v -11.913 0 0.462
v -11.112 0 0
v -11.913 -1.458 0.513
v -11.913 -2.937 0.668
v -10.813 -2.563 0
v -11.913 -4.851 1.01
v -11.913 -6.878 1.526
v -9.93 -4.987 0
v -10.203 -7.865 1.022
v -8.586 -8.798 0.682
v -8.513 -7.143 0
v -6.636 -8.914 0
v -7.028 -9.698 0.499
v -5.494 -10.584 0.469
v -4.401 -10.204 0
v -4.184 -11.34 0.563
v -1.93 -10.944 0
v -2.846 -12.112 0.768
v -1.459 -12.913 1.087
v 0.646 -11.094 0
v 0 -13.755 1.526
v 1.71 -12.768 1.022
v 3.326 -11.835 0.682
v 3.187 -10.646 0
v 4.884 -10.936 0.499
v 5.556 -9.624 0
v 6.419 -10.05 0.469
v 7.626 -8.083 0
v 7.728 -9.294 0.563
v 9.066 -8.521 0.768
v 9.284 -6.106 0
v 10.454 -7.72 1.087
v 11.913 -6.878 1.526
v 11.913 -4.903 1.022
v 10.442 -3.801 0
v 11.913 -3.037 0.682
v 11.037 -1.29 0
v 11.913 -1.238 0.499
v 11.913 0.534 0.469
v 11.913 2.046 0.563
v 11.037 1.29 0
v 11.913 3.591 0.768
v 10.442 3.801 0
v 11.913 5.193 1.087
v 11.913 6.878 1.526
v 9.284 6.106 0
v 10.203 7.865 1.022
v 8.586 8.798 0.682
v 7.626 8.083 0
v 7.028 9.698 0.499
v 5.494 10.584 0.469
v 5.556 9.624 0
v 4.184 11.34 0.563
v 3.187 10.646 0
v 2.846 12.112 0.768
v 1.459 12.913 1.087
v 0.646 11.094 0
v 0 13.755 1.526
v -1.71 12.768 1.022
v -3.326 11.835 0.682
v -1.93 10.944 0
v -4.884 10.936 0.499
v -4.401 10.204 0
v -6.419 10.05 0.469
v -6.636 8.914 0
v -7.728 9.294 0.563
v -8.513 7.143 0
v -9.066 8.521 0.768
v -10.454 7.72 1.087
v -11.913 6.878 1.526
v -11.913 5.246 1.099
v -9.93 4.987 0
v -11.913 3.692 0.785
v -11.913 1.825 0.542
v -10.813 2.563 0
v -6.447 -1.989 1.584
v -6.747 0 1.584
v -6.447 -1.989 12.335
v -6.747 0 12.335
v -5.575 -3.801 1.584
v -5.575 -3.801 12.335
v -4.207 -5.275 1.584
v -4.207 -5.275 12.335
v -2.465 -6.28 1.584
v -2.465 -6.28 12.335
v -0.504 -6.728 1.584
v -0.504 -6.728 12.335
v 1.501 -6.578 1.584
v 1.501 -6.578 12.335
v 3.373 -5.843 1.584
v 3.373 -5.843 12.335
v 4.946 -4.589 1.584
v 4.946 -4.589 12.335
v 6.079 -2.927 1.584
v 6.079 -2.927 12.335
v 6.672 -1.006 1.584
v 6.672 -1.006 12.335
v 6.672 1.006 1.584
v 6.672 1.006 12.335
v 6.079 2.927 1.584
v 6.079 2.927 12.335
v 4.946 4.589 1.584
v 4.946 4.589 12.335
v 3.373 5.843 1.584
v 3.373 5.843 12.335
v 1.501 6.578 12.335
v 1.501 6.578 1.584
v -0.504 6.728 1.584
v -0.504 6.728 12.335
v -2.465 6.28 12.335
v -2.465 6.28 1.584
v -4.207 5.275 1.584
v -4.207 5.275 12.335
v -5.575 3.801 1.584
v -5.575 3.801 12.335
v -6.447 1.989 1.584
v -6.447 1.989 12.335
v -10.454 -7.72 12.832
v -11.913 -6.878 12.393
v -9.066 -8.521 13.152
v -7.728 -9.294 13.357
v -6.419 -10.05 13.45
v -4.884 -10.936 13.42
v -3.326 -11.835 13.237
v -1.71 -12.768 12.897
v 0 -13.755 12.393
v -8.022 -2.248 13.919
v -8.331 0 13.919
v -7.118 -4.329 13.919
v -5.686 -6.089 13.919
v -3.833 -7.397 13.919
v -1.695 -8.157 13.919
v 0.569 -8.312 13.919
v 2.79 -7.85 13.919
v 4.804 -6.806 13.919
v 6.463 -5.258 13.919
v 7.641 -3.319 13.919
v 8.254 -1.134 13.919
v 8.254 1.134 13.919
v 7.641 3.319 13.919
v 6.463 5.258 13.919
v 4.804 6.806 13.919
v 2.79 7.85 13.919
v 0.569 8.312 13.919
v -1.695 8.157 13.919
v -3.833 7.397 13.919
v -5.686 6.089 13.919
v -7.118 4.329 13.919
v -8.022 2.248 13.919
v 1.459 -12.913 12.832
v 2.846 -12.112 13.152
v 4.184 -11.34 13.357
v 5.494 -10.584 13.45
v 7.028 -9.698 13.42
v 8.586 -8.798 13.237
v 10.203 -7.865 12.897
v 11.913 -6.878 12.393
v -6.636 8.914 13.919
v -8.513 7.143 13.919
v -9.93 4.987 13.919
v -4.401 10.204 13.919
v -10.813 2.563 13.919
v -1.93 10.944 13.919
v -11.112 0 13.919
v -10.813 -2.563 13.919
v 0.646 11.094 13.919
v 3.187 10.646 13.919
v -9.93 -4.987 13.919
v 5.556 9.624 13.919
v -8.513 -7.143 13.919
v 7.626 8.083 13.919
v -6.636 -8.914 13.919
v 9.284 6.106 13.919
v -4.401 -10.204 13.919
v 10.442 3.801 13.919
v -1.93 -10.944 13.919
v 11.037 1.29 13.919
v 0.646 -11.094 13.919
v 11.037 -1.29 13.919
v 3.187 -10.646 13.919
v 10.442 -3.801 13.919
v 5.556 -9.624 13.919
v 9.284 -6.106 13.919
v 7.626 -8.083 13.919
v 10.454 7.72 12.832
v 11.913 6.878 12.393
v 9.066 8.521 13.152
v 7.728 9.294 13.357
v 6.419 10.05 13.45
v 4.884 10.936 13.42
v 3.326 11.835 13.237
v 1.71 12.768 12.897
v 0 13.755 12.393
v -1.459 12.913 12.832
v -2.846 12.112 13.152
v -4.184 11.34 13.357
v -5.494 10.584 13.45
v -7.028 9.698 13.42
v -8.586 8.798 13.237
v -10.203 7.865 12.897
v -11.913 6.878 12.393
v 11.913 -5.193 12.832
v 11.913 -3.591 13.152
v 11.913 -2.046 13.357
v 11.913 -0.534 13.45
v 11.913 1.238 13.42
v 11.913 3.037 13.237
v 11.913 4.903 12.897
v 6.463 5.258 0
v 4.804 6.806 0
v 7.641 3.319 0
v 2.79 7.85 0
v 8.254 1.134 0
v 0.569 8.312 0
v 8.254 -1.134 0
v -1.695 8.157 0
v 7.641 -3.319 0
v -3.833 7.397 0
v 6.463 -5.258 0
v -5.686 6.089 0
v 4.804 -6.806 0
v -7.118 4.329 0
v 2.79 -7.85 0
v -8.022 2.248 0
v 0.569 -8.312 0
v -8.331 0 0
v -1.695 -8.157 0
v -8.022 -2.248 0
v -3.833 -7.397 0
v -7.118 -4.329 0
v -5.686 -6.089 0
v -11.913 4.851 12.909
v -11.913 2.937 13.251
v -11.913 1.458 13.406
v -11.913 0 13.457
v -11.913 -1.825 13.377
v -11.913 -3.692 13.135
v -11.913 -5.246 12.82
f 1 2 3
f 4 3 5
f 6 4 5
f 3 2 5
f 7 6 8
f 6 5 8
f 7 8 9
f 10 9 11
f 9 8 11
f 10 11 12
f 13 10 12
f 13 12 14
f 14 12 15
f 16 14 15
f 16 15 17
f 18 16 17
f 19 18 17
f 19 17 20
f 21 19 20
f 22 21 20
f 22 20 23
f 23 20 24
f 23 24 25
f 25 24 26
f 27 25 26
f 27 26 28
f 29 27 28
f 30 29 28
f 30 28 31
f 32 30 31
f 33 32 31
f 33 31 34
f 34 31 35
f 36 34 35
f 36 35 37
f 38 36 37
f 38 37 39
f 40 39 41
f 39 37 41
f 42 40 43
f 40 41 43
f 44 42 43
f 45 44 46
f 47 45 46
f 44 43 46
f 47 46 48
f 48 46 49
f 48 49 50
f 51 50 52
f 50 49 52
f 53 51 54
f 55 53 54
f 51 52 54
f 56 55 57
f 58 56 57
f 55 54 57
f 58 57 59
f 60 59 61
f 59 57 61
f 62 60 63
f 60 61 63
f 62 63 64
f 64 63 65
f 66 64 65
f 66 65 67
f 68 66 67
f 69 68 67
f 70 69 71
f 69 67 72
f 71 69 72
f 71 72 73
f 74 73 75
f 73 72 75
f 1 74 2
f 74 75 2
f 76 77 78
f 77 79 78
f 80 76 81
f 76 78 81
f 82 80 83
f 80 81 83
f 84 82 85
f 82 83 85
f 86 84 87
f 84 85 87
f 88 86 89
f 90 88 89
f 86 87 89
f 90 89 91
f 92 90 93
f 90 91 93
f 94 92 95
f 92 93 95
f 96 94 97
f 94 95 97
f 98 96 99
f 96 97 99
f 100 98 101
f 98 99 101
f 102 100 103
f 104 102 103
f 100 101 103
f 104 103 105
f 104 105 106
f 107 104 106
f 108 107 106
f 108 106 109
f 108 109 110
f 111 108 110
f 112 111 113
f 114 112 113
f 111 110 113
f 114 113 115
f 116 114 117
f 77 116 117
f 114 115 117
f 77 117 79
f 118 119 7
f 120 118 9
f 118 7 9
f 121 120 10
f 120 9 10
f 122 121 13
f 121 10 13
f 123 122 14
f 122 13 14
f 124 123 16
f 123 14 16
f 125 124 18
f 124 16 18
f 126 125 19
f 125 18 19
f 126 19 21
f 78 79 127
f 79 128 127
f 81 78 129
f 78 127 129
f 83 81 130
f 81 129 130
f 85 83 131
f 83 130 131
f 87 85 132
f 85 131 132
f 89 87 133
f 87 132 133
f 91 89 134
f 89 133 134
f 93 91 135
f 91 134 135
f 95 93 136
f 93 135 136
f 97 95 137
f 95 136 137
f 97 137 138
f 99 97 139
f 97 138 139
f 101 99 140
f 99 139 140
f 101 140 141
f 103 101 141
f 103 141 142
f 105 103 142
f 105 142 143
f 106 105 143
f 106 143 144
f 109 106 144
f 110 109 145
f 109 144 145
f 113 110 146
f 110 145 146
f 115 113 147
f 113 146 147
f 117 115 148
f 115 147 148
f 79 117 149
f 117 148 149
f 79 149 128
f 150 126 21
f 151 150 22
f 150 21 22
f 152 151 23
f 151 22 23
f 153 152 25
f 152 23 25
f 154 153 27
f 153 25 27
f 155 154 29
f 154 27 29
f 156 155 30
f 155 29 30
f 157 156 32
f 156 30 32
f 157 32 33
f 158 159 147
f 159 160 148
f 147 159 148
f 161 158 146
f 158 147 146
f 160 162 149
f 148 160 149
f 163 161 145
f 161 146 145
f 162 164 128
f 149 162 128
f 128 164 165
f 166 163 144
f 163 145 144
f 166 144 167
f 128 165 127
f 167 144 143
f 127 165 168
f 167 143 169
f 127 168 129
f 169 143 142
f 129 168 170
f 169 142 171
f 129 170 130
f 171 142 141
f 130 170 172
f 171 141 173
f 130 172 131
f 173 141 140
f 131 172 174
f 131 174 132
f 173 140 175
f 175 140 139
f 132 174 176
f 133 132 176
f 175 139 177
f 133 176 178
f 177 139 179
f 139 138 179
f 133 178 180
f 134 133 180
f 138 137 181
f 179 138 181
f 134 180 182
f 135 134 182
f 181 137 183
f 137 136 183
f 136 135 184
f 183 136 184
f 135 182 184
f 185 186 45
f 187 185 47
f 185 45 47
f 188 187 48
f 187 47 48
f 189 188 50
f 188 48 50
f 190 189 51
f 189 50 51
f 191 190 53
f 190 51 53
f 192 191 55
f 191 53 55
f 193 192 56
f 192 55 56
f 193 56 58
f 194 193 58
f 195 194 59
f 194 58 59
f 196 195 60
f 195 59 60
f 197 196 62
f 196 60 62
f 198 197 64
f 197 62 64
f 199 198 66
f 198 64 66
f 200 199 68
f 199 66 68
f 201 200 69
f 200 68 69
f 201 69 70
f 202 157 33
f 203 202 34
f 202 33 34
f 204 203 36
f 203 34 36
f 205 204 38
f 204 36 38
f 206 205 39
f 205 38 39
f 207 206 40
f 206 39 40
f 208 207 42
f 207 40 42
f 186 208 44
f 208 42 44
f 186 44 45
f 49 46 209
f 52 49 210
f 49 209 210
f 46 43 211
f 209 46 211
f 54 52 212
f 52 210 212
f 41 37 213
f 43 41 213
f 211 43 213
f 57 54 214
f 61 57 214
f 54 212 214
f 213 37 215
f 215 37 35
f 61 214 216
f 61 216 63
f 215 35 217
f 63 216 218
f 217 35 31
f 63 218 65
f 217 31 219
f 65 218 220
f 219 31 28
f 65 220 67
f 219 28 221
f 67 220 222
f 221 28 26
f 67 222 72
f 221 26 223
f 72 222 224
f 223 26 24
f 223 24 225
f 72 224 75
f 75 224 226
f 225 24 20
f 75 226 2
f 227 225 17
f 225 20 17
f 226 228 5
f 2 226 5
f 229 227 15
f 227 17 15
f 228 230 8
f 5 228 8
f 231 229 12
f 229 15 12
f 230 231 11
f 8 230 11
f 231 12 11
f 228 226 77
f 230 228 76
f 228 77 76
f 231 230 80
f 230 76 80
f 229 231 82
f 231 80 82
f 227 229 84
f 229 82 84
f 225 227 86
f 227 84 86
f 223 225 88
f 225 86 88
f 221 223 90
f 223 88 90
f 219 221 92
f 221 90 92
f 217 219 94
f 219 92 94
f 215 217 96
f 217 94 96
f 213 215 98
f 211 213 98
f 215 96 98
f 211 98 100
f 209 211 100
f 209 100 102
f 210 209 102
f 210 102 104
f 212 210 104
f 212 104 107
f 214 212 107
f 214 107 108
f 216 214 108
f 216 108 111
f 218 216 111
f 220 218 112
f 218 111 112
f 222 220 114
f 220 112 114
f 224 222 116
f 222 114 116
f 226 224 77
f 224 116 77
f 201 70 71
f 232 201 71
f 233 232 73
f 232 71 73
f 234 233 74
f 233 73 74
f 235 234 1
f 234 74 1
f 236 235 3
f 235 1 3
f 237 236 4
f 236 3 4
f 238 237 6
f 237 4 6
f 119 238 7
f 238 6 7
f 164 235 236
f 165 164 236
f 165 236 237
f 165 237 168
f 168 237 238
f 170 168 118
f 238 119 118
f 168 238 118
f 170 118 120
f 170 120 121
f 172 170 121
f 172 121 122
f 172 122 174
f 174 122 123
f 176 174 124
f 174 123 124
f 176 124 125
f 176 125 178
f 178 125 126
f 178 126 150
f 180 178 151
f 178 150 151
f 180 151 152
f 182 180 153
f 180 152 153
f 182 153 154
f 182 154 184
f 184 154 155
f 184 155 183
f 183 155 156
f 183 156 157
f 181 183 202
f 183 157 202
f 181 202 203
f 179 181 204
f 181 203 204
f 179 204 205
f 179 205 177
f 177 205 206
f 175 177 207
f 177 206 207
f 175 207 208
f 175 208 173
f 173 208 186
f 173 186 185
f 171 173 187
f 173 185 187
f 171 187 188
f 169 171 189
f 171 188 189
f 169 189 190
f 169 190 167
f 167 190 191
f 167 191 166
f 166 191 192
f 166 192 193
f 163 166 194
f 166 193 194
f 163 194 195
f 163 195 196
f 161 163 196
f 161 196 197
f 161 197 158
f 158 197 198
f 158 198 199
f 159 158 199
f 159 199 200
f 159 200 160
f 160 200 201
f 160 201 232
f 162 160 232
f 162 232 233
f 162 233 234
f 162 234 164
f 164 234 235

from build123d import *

# Parameters (mm, degrees)
SKETCH2_OUTSIDE_W  = 43.152
SKETCH2_OUTSIDE_H  = 43.152
CUT_EXTRUDE2_DEPTH = 25.4


with BuildPart() as part:
    # Sketch1 → Revolve1 (revolve)
    with BuildSketch(Plane(origin=(0, 0, 0), x_dir=(0, 0, -1), z_dir=(1, 0, 0)), mode=Mode.PRIVATE) as revolve1_sk:
        Polygon((-1.584325, 6.746875), (-12.334875, 6.746875), (-13.9192, 8.3312), (-13.9192, 11.1125), (-11.169569343, 15.875), (-2.749630657, 15.875), (0, 11.1125), (0, 8.3312), align=None)
    revolve(revolve1_sk.sketch.rotate(Axis((0, 0, -10.380814409), (0, 0, 1)), 90), axis=Axis((0, 0, -10.380814409), (0, 0, 1)))

    # Sketch2 outside → Cut-Extrude2 (cut)
    with BuildSketch(Plane.XY):
        Rectangle(SKETCH2_OUTSIDE_W, SKETCH2_OUTSIDE_H)
        Polygon((0, 13.755485633), (-11.9126, 6.877742817), (-11.9126, -6.877742817), (0, -13.755485633), (11.9126, -6.877742817), (11.9126, 6.877742817), align=None, mode=Mode.SUBTRACT)
    extrude(amount=CUT_EXTRUDE2_DEPTH, mode=Mode.SUBTRACT)


solid = part.part
